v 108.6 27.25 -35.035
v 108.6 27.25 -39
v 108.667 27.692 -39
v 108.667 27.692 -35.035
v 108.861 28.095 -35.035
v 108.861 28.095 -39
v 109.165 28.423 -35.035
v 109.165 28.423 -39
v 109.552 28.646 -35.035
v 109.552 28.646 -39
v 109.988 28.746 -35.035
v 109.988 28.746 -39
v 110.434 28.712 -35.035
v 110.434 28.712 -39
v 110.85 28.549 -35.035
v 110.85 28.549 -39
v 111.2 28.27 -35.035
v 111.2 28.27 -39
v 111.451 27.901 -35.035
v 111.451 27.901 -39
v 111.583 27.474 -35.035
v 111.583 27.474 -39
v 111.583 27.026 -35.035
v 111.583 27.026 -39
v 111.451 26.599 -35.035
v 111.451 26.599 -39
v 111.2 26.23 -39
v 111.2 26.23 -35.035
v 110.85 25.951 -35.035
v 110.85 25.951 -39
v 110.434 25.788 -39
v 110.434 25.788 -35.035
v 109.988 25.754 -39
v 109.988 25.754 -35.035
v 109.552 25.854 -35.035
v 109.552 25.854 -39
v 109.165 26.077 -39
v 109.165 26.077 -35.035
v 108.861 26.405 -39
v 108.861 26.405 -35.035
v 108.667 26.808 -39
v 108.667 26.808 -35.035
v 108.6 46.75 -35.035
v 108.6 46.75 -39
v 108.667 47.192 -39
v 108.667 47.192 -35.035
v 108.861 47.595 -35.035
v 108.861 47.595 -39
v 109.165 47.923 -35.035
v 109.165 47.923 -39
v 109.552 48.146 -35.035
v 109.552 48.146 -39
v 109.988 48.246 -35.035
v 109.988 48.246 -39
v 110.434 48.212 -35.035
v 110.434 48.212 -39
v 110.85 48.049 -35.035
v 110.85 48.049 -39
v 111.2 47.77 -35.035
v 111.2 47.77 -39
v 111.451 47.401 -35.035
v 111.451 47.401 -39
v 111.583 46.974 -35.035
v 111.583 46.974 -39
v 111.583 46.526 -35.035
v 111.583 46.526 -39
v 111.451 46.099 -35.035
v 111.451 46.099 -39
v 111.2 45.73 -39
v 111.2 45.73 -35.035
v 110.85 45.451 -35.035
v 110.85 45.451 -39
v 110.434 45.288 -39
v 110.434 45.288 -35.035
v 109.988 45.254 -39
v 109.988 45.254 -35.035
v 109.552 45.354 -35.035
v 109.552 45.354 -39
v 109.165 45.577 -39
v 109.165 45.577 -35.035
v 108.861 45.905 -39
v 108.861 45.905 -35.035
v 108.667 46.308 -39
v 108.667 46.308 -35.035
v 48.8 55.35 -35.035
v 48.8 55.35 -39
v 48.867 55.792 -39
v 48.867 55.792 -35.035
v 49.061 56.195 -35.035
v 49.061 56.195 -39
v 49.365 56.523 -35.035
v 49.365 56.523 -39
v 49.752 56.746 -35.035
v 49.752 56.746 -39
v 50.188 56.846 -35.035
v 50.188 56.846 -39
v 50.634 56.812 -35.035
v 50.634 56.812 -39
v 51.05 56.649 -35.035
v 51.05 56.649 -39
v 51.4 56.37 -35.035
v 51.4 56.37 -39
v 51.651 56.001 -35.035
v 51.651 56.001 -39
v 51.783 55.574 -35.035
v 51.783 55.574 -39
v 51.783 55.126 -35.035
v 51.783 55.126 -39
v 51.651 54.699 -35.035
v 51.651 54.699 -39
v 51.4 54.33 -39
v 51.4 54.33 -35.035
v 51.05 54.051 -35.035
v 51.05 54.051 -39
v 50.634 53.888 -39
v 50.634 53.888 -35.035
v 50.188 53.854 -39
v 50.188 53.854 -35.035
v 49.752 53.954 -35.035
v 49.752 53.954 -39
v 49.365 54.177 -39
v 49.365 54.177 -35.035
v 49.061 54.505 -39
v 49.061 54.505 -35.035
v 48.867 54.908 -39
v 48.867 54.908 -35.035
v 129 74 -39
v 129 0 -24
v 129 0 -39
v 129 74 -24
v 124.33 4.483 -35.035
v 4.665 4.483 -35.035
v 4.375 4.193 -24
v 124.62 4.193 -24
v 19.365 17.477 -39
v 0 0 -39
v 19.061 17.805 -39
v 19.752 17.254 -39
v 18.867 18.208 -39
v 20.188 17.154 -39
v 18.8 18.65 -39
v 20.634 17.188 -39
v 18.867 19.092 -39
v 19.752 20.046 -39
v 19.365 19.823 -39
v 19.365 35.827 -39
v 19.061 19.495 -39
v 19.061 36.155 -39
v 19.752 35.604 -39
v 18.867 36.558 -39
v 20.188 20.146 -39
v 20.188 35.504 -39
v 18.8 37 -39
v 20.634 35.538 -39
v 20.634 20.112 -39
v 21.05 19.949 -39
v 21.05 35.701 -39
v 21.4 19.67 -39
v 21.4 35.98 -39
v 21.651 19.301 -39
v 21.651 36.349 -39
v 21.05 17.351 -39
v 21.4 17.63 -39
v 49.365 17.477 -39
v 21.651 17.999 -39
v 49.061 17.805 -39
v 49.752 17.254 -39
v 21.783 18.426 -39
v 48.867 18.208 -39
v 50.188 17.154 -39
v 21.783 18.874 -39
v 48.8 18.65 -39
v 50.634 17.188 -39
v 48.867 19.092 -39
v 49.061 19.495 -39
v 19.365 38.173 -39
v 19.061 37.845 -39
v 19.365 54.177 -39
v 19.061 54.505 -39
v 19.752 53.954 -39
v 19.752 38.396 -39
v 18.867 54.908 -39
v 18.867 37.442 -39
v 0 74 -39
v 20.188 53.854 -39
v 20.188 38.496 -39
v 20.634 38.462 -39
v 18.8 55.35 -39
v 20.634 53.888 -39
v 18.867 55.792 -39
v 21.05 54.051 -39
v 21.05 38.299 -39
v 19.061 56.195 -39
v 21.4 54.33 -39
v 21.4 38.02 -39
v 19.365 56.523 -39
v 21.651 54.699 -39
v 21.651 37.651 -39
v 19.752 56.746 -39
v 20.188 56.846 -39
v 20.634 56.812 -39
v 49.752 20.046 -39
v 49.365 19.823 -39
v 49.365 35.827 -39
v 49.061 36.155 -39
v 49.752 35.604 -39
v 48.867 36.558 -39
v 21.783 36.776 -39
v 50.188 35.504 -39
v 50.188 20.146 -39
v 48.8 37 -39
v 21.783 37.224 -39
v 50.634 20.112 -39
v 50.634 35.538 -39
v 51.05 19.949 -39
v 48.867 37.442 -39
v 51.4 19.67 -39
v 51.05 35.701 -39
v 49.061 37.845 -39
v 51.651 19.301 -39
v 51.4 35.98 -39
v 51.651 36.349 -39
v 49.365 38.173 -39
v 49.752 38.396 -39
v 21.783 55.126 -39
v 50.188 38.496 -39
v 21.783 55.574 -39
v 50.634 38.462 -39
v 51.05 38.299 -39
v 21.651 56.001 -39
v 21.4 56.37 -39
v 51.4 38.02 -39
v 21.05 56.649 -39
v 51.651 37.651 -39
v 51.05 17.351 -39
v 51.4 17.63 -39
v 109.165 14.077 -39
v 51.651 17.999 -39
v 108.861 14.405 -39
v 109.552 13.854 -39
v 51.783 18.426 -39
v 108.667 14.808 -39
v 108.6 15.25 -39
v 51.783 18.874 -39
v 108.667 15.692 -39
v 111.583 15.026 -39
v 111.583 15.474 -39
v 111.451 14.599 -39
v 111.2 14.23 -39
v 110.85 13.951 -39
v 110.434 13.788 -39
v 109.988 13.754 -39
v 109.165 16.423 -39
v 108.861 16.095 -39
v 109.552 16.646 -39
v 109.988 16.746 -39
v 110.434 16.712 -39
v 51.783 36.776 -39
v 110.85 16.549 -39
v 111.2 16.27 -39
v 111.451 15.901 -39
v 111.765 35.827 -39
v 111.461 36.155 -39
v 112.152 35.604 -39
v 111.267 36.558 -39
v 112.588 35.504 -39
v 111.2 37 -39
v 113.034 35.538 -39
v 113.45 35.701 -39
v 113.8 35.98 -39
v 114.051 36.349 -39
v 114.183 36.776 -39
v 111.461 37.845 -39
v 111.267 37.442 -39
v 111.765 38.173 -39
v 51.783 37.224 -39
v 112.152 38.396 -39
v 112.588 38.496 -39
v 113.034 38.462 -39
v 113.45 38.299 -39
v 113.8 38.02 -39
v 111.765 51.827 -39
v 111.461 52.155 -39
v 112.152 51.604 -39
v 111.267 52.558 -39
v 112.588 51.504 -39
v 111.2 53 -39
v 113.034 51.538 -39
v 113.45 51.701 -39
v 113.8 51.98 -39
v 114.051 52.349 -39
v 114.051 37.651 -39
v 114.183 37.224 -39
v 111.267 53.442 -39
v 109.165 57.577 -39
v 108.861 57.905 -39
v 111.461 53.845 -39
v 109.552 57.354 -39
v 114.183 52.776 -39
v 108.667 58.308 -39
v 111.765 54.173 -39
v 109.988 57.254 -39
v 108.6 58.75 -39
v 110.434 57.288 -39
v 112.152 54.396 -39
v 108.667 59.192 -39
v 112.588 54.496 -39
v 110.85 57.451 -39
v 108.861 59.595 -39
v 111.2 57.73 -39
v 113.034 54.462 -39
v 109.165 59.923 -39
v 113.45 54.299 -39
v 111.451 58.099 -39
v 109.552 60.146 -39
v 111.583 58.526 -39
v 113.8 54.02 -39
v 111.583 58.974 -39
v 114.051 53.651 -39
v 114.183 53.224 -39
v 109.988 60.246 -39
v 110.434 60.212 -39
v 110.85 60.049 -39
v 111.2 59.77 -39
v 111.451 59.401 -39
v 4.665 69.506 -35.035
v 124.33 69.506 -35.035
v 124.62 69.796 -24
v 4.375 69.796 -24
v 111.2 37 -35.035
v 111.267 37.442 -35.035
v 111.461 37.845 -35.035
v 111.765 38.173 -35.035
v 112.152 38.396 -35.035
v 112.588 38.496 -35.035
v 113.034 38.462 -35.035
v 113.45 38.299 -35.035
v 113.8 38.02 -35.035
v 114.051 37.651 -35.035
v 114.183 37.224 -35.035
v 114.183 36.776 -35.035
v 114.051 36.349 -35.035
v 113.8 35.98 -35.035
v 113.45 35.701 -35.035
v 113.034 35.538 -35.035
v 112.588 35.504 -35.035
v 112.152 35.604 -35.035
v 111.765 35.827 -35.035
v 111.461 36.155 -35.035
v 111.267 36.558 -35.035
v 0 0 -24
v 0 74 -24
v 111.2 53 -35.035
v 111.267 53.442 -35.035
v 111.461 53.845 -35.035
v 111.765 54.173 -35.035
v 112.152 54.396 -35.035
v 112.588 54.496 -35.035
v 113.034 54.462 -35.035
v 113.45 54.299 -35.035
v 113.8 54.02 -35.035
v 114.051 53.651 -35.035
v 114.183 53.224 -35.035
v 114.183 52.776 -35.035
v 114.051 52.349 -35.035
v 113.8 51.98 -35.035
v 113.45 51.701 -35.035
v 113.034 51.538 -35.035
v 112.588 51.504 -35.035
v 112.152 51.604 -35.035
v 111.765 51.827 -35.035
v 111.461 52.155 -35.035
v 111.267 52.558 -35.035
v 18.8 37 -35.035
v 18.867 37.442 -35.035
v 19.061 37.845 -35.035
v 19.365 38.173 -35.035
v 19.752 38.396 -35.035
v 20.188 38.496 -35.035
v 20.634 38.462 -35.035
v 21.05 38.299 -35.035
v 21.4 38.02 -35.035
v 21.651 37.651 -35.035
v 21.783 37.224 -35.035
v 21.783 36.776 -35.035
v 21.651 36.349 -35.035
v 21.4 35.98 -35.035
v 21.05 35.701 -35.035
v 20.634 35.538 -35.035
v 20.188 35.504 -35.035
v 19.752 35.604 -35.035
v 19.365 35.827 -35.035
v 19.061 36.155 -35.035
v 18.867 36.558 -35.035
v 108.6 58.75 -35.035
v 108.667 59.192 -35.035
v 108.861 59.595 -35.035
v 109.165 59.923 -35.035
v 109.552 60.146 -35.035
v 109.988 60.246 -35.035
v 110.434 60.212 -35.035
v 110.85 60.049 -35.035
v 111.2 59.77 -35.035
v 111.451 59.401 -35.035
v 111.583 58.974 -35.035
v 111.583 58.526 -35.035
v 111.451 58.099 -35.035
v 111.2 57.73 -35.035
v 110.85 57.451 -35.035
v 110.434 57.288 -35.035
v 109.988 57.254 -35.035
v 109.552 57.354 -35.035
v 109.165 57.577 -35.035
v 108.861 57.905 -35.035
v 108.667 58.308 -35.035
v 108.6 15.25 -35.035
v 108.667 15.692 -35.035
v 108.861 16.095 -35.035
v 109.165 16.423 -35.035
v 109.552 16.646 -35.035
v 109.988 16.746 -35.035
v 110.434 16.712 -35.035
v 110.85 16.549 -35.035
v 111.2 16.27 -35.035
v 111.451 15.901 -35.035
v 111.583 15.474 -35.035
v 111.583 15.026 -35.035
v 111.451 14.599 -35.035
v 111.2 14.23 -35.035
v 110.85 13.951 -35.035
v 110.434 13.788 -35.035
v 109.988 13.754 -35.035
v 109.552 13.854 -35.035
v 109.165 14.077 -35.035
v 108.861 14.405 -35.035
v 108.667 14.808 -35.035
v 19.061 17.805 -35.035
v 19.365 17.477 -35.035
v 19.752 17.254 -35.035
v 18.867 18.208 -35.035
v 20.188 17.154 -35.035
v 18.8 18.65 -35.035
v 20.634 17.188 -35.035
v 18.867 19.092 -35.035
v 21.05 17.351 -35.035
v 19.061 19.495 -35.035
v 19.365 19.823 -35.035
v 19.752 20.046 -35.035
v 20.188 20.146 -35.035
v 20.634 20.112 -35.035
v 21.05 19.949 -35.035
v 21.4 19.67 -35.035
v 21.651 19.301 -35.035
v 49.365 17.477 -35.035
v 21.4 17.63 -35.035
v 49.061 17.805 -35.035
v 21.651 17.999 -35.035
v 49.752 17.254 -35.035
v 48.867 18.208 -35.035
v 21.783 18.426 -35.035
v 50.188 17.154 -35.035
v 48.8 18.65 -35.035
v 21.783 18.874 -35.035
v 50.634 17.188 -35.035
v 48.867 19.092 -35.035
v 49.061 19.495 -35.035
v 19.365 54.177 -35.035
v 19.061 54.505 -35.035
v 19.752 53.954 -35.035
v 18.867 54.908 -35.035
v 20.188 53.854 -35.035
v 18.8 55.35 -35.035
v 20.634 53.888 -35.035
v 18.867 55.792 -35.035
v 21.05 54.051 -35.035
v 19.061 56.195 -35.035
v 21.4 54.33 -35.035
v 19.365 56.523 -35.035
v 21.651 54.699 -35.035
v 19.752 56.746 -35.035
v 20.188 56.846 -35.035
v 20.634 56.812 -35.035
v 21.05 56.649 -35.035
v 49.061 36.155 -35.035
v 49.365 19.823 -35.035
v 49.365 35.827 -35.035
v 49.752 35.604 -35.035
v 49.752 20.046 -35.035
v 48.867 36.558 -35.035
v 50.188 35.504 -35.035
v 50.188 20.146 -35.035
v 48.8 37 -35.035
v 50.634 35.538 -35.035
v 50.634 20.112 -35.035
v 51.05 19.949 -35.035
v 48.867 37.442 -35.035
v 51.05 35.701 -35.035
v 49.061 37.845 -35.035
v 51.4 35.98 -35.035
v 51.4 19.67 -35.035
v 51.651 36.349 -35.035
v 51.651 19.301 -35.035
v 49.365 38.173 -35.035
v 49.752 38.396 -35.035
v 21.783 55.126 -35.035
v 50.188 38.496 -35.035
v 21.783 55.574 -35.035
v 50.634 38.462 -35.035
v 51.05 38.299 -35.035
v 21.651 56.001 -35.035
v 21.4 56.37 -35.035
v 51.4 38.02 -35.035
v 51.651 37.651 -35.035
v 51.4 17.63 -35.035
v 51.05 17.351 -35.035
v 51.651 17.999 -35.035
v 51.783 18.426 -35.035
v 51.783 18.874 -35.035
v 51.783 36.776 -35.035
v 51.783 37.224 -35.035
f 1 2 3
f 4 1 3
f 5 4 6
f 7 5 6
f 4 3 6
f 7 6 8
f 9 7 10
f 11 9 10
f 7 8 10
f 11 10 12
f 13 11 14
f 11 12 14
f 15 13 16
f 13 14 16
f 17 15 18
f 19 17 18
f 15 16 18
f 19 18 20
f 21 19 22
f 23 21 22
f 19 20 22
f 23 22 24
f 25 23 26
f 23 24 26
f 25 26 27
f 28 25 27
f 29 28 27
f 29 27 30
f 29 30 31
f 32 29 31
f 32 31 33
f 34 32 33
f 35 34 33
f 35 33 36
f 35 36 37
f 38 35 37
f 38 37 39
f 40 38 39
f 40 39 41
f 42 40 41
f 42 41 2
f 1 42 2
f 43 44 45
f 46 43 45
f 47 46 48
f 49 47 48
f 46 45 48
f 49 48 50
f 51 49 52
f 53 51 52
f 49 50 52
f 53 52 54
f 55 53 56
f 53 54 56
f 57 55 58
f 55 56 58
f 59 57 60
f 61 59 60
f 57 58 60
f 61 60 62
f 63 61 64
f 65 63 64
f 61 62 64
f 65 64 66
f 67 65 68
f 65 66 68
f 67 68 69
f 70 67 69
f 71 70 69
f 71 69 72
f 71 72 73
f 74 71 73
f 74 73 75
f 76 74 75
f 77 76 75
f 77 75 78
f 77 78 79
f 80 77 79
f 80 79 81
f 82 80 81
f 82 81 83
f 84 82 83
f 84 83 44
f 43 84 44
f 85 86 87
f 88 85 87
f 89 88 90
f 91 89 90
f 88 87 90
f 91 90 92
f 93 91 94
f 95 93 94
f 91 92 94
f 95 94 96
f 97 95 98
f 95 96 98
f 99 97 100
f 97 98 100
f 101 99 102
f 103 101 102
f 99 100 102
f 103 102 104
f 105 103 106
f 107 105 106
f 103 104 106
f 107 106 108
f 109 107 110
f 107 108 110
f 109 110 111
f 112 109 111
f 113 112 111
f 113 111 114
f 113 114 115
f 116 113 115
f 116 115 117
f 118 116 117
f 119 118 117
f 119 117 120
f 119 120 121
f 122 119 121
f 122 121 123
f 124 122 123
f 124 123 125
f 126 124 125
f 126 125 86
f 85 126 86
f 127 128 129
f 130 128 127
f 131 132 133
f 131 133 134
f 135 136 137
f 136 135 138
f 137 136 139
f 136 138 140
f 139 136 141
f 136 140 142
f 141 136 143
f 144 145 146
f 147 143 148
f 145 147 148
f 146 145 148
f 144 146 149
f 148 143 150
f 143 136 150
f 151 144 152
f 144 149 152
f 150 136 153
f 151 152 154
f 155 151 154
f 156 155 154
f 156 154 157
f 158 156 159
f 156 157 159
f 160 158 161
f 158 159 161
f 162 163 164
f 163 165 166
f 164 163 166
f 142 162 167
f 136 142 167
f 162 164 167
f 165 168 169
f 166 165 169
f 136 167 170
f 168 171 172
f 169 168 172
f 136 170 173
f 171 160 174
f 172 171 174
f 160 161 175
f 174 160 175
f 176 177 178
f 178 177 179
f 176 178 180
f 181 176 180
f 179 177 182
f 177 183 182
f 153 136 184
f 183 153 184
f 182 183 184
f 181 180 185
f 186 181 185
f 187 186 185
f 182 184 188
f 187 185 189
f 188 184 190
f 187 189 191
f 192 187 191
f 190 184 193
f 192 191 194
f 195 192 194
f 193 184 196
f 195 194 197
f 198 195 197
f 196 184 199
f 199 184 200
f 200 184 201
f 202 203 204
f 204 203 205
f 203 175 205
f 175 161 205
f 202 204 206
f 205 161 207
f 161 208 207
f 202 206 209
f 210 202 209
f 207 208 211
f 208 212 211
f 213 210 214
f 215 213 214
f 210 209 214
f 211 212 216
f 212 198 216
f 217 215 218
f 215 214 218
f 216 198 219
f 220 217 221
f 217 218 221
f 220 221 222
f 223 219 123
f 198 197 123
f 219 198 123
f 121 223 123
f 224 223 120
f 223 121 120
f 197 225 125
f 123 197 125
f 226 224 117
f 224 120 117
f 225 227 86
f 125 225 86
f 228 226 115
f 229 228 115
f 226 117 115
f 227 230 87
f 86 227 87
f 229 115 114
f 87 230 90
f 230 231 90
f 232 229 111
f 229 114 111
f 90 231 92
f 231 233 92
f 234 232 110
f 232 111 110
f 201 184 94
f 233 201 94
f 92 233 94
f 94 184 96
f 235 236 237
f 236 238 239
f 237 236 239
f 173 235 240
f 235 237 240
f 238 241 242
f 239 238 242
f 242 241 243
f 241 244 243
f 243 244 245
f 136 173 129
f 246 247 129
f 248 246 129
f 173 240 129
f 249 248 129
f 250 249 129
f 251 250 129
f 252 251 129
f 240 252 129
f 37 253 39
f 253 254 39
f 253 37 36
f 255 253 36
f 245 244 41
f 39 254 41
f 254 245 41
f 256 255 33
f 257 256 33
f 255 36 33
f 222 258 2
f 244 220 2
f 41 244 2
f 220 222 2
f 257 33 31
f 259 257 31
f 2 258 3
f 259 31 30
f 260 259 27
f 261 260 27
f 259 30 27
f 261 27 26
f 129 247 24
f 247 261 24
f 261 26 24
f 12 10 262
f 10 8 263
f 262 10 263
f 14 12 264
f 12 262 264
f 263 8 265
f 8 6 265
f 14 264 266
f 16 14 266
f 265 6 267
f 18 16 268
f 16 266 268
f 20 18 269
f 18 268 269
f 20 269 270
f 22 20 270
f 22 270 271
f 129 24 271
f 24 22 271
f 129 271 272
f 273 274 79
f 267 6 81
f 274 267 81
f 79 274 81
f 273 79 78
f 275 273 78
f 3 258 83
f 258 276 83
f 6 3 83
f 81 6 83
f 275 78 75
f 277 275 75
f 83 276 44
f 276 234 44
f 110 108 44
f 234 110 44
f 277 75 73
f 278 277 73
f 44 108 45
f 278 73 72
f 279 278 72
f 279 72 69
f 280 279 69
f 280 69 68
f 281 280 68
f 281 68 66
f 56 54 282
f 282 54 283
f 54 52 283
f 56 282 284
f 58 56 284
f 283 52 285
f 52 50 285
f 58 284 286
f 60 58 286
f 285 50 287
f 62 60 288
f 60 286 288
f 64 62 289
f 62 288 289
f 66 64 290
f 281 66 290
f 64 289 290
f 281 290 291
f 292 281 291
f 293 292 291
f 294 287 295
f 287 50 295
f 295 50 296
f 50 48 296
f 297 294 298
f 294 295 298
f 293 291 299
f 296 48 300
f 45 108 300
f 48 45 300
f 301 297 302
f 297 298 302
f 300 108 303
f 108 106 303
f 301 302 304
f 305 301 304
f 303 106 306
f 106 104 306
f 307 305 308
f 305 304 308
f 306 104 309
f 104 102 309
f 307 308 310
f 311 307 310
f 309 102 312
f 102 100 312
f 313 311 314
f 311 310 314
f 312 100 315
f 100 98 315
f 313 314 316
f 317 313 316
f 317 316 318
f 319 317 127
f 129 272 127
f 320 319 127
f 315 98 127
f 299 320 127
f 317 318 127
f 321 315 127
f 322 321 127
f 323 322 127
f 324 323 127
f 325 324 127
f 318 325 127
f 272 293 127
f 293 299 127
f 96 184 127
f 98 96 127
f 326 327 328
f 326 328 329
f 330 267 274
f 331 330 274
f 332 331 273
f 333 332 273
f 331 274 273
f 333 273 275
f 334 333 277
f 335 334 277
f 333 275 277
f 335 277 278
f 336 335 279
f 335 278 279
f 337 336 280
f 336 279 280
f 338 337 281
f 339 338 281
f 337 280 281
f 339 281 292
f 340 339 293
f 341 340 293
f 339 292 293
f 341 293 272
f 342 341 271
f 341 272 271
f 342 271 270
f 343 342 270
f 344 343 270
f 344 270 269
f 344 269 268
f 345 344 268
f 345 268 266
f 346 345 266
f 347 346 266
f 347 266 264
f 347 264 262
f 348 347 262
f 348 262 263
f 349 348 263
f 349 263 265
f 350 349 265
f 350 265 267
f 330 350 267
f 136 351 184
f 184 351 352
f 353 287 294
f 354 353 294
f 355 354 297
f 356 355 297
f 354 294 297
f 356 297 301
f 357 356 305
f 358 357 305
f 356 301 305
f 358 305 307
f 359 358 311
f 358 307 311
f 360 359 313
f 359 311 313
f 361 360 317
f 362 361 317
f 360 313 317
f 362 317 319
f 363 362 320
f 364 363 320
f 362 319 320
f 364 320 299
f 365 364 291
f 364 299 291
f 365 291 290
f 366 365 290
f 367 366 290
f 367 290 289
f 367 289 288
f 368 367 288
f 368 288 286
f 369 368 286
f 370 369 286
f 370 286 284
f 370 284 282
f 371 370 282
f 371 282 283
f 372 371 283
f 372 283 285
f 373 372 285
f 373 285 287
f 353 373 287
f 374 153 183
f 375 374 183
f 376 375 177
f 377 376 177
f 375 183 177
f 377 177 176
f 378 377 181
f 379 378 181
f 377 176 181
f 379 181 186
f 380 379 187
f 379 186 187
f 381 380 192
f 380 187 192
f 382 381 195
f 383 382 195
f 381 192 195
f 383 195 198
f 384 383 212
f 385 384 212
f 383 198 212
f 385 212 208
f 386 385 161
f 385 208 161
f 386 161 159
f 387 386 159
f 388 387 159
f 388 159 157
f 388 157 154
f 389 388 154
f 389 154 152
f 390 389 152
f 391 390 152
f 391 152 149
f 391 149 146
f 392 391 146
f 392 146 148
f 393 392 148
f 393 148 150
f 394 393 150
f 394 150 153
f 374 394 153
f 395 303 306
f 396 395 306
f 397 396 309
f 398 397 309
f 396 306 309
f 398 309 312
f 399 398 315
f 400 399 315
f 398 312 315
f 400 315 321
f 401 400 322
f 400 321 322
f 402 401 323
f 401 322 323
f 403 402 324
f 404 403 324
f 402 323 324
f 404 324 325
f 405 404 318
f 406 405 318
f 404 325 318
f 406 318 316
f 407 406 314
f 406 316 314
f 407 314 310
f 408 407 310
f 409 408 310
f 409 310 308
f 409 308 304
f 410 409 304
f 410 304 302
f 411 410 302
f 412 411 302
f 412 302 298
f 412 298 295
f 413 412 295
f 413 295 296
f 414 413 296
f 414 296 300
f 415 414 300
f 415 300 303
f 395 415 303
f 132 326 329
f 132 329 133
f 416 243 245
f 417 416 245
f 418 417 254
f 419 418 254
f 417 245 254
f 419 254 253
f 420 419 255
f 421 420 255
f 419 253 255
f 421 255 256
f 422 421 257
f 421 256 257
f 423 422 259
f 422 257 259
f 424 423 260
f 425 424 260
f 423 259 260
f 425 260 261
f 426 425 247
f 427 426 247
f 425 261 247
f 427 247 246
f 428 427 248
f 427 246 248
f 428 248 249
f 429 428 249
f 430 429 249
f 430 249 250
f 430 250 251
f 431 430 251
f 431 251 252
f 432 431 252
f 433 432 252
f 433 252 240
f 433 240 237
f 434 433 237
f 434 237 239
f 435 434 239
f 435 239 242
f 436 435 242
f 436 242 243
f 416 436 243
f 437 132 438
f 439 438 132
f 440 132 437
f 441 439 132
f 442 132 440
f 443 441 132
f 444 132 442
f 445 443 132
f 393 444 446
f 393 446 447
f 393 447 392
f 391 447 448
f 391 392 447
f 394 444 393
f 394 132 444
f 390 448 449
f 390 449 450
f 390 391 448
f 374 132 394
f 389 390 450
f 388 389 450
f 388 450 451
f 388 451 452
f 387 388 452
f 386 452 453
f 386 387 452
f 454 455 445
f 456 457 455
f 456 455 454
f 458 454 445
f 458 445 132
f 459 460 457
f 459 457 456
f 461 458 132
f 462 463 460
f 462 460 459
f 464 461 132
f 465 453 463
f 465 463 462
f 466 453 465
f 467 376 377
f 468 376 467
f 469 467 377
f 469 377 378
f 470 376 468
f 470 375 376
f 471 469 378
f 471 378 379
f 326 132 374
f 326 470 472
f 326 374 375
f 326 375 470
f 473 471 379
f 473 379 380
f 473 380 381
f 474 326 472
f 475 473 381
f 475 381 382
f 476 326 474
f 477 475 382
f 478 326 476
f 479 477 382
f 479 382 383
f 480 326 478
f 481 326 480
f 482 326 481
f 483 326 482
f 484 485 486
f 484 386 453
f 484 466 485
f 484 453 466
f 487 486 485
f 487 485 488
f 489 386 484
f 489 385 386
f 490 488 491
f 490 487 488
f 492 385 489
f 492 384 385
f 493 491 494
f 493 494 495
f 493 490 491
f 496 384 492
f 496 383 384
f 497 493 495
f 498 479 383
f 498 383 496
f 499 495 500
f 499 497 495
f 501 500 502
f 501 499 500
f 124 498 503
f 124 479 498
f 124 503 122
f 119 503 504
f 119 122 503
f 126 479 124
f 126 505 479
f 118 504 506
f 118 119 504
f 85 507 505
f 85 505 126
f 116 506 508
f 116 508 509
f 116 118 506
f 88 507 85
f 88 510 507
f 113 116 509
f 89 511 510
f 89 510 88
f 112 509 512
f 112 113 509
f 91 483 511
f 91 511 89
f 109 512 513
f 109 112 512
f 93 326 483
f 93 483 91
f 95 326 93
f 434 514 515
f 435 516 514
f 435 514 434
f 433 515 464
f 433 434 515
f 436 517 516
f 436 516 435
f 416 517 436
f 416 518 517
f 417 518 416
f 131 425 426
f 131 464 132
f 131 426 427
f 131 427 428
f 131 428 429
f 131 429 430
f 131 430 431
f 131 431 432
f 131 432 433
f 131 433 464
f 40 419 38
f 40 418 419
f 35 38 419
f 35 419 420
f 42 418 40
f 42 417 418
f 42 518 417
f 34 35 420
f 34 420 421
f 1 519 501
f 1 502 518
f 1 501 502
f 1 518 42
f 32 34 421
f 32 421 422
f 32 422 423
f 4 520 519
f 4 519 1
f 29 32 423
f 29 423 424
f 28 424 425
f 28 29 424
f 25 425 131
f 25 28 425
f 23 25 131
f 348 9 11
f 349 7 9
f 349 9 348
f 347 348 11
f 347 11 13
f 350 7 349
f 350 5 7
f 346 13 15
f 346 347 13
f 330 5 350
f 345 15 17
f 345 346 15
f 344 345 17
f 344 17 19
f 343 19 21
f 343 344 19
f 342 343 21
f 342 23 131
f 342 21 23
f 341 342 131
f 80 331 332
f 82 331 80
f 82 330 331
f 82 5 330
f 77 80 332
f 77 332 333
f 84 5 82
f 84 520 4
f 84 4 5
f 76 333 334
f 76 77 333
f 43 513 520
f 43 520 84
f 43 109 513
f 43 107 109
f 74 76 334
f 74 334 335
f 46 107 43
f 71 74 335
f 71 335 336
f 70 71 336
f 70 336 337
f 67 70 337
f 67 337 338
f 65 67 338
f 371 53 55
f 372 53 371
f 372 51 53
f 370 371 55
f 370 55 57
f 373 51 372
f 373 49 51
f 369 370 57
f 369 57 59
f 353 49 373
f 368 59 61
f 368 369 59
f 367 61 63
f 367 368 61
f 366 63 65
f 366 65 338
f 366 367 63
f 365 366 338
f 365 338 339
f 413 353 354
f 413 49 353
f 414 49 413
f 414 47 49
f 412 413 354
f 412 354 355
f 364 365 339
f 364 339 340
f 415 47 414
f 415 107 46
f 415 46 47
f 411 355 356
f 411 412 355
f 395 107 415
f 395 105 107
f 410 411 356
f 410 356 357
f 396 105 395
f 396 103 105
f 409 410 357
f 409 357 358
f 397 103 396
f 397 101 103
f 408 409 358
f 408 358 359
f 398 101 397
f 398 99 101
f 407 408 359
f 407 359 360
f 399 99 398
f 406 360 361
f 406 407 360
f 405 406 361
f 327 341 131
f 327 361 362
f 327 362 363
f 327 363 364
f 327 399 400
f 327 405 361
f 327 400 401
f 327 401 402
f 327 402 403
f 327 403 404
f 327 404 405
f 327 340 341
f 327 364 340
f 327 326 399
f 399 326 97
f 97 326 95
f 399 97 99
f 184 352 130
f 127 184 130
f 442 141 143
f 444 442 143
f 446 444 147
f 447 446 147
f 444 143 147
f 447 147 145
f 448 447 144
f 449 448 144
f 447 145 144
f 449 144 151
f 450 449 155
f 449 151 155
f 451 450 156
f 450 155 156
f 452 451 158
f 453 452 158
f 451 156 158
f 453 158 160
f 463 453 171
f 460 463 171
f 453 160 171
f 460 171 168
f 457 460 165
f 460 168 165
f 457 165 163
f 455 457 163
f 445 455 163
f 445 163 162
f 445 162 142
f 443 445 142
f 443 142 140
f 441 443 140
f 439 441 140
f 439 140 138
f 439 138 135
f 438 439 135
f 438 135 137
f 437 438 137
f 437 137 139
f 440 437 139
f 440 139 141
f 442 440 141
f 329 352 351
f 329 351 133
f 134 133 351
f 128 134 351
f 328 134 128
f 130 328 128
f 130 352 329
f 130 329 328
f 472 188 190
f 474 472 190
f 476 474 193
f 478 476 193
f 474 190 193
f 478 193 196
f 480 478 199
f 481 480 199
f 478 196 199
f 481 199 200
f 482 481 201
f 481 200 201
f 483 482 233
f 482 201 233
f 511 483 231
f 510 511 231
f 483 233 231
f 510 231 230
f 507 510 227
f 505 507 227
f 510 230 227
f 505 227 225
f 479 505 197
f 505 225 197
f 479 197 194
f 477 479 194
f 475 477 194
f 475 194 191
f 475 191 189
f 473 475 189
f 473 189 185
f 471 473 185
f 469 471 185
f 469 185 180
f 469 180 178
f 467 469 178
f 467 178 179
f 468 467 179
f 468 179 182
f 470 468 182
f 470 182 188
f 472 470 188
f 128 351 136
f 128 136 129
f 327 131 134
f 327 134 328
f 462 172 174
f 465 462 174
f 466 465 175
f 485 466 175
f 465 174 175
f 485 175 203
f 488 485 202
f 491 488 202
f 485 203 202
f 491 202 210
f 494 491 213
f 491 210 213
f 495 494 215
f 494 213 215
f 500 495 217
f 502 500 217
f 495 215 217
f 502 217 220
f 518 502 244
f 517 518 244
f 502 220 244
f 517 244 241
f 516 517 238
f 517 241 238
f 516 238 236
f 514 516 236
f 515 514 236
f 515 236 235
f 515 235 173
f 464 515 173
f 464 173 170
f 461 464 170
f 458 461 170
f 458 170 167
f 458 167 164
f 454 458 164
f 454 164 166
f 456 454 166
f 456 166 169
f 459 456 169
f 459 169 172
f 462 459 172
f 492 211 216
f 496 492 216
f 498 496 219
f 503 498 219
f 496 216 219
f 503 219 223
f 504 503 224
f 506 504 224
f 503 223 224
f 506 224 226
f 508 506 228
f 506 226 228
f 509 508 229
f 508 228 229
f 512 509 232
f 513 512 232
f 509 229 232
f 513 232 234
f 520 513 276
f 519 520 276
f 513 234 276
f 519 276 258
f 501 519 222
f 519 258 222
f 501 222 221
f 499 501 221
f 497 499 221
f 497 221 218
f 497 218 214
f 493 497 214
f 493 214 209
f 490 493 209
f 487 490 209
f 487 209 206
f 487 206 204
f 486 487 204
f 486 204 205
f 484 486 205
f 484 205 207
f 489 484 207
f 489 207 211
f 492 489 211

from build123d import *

# Parameters (mm, degrees)
SKETCH1_W           = 129
SKETCH1_H           = 74
BOSS_EXTRUDE1_DEPTH = 39
SKETCH2_R           = 1.5
CUT_EXTRUDE1_DEPTH  = 10
SKETCH4_W           = 129
SKETCH4_H           = 24
CUT_EXTRUDE3_DEPTH  = 100


with BuildPart() as part:
    # Sketch1 → Boss-Extrude1 (new body)
    with BuildSketch(Plane.XY):
        with Locations((64.5, 37)):
            Rectangle(SKETCH1_W, SKETCH1_H)
    extrude(amount=-BOSS_EXTRUDE1_DEPTH)

    # Sketch2 → Cut-Extrude1 (cut)
    with BuildSketch(Plane(origin=(0, 0, -39), x_dir=(-1, 0, 0), z_dir=(0, 0, -1))):
        with Locations((-50.3, 37)):
            Circle(SKETCH2_R)
        with Locations((-50.3, 55.35)):
            Circle(SKETCH2_R)
        with Locations((-50.3, 18.65)):
            Circle(SKETCH2_R)
        with Locations((-20.3, 55.35)):
            Circle(SKETCH2_R)
        with Locations((-20.3, 37)):
            Circle(SKETCH2_R)
        with Locations((-20.3, 18.65)):
            Circle(SKETCH2_R)
        with Locations((-112.7, 37)):
            Circle(SKETCH2_R)
        with Locations((-112.7, 53)):
            Circle(SKETCH2_R)
        with Locations((-110.1, 58.75)):
            Circle(SKETCH2_R)
        with Locations((-110.1, 46.75)):
            Circle(SKETCH2_R)
        with Locations((-110.1, 15.25)):
            Circle(SKETCH2_R)
        with Locations((-110.1, 27.25)):
            Circle(SKETCH2_R)
    extrude(amount=-CUT_EXTRUDE1_DEPTH, mode=Mode.SUBTRACT)

    # Cavity1: read off the stored shape, not the designer's step
    # Cavity1: loft between two sections, ruled curve by curve
    cavity1_from = [
        Edge.make_line((125.249, 3.561625, 0), (125.249, 70.427375, 0)),
        Edge.make_line((3.746, 3.561625, 0), (125.249, 3.561625, 0)),
        Edge.make_line((3.746, 70.427375, 0), (3.746, 3.561625, 0)),
        Edge.make_line((125.249, 70.427375, 0), (3.746, 70.427375, 0)),
    ]
    cavity1_to = [
        Edge.make_line((124.330201477, 4.483173045, -35.035), (124.330201477, 69.505826955, -35.035)),
        Edge.make_line((4.664798523, 4.483173045, -35.035), (124.330201477, 4.483173045, -35.035)),
        Edge.make_line((4.664798523, 69.505826955, -35.035), (4.664798523, 4.483173045, -35.035)),
        Edge.make_line((124.330201477, 69.505826955, -35.035), (4.664798523, 69.505826955, -35.035)),
    ]
    cavity1 = Solid(Shell([*[Face.make_surface_from_curves(cavity1_from[k], cavity1_to[k]) for k in range(4)], Face(Wire(cavity1_from)), Face(Wire(cavity1_to))]))
    add(cavity1, mode=Mode.SUBTRACT)

    # Sketch4 → Cut-Extrude3 (cut)
    with BuildSketch(Plane(origin=(0, 74, 0), x_dir=(1, 0, 0), z_dir=(0, 1, 0))):
        with Locations((64.5, 12)):
            Rectangle(SKETCH4_W, SKETCH4_H)
    extrude(amount=-CUT_EXTRUDE3_DEPTH, mode=Mode.SUBTRACT)


solid = part.part
